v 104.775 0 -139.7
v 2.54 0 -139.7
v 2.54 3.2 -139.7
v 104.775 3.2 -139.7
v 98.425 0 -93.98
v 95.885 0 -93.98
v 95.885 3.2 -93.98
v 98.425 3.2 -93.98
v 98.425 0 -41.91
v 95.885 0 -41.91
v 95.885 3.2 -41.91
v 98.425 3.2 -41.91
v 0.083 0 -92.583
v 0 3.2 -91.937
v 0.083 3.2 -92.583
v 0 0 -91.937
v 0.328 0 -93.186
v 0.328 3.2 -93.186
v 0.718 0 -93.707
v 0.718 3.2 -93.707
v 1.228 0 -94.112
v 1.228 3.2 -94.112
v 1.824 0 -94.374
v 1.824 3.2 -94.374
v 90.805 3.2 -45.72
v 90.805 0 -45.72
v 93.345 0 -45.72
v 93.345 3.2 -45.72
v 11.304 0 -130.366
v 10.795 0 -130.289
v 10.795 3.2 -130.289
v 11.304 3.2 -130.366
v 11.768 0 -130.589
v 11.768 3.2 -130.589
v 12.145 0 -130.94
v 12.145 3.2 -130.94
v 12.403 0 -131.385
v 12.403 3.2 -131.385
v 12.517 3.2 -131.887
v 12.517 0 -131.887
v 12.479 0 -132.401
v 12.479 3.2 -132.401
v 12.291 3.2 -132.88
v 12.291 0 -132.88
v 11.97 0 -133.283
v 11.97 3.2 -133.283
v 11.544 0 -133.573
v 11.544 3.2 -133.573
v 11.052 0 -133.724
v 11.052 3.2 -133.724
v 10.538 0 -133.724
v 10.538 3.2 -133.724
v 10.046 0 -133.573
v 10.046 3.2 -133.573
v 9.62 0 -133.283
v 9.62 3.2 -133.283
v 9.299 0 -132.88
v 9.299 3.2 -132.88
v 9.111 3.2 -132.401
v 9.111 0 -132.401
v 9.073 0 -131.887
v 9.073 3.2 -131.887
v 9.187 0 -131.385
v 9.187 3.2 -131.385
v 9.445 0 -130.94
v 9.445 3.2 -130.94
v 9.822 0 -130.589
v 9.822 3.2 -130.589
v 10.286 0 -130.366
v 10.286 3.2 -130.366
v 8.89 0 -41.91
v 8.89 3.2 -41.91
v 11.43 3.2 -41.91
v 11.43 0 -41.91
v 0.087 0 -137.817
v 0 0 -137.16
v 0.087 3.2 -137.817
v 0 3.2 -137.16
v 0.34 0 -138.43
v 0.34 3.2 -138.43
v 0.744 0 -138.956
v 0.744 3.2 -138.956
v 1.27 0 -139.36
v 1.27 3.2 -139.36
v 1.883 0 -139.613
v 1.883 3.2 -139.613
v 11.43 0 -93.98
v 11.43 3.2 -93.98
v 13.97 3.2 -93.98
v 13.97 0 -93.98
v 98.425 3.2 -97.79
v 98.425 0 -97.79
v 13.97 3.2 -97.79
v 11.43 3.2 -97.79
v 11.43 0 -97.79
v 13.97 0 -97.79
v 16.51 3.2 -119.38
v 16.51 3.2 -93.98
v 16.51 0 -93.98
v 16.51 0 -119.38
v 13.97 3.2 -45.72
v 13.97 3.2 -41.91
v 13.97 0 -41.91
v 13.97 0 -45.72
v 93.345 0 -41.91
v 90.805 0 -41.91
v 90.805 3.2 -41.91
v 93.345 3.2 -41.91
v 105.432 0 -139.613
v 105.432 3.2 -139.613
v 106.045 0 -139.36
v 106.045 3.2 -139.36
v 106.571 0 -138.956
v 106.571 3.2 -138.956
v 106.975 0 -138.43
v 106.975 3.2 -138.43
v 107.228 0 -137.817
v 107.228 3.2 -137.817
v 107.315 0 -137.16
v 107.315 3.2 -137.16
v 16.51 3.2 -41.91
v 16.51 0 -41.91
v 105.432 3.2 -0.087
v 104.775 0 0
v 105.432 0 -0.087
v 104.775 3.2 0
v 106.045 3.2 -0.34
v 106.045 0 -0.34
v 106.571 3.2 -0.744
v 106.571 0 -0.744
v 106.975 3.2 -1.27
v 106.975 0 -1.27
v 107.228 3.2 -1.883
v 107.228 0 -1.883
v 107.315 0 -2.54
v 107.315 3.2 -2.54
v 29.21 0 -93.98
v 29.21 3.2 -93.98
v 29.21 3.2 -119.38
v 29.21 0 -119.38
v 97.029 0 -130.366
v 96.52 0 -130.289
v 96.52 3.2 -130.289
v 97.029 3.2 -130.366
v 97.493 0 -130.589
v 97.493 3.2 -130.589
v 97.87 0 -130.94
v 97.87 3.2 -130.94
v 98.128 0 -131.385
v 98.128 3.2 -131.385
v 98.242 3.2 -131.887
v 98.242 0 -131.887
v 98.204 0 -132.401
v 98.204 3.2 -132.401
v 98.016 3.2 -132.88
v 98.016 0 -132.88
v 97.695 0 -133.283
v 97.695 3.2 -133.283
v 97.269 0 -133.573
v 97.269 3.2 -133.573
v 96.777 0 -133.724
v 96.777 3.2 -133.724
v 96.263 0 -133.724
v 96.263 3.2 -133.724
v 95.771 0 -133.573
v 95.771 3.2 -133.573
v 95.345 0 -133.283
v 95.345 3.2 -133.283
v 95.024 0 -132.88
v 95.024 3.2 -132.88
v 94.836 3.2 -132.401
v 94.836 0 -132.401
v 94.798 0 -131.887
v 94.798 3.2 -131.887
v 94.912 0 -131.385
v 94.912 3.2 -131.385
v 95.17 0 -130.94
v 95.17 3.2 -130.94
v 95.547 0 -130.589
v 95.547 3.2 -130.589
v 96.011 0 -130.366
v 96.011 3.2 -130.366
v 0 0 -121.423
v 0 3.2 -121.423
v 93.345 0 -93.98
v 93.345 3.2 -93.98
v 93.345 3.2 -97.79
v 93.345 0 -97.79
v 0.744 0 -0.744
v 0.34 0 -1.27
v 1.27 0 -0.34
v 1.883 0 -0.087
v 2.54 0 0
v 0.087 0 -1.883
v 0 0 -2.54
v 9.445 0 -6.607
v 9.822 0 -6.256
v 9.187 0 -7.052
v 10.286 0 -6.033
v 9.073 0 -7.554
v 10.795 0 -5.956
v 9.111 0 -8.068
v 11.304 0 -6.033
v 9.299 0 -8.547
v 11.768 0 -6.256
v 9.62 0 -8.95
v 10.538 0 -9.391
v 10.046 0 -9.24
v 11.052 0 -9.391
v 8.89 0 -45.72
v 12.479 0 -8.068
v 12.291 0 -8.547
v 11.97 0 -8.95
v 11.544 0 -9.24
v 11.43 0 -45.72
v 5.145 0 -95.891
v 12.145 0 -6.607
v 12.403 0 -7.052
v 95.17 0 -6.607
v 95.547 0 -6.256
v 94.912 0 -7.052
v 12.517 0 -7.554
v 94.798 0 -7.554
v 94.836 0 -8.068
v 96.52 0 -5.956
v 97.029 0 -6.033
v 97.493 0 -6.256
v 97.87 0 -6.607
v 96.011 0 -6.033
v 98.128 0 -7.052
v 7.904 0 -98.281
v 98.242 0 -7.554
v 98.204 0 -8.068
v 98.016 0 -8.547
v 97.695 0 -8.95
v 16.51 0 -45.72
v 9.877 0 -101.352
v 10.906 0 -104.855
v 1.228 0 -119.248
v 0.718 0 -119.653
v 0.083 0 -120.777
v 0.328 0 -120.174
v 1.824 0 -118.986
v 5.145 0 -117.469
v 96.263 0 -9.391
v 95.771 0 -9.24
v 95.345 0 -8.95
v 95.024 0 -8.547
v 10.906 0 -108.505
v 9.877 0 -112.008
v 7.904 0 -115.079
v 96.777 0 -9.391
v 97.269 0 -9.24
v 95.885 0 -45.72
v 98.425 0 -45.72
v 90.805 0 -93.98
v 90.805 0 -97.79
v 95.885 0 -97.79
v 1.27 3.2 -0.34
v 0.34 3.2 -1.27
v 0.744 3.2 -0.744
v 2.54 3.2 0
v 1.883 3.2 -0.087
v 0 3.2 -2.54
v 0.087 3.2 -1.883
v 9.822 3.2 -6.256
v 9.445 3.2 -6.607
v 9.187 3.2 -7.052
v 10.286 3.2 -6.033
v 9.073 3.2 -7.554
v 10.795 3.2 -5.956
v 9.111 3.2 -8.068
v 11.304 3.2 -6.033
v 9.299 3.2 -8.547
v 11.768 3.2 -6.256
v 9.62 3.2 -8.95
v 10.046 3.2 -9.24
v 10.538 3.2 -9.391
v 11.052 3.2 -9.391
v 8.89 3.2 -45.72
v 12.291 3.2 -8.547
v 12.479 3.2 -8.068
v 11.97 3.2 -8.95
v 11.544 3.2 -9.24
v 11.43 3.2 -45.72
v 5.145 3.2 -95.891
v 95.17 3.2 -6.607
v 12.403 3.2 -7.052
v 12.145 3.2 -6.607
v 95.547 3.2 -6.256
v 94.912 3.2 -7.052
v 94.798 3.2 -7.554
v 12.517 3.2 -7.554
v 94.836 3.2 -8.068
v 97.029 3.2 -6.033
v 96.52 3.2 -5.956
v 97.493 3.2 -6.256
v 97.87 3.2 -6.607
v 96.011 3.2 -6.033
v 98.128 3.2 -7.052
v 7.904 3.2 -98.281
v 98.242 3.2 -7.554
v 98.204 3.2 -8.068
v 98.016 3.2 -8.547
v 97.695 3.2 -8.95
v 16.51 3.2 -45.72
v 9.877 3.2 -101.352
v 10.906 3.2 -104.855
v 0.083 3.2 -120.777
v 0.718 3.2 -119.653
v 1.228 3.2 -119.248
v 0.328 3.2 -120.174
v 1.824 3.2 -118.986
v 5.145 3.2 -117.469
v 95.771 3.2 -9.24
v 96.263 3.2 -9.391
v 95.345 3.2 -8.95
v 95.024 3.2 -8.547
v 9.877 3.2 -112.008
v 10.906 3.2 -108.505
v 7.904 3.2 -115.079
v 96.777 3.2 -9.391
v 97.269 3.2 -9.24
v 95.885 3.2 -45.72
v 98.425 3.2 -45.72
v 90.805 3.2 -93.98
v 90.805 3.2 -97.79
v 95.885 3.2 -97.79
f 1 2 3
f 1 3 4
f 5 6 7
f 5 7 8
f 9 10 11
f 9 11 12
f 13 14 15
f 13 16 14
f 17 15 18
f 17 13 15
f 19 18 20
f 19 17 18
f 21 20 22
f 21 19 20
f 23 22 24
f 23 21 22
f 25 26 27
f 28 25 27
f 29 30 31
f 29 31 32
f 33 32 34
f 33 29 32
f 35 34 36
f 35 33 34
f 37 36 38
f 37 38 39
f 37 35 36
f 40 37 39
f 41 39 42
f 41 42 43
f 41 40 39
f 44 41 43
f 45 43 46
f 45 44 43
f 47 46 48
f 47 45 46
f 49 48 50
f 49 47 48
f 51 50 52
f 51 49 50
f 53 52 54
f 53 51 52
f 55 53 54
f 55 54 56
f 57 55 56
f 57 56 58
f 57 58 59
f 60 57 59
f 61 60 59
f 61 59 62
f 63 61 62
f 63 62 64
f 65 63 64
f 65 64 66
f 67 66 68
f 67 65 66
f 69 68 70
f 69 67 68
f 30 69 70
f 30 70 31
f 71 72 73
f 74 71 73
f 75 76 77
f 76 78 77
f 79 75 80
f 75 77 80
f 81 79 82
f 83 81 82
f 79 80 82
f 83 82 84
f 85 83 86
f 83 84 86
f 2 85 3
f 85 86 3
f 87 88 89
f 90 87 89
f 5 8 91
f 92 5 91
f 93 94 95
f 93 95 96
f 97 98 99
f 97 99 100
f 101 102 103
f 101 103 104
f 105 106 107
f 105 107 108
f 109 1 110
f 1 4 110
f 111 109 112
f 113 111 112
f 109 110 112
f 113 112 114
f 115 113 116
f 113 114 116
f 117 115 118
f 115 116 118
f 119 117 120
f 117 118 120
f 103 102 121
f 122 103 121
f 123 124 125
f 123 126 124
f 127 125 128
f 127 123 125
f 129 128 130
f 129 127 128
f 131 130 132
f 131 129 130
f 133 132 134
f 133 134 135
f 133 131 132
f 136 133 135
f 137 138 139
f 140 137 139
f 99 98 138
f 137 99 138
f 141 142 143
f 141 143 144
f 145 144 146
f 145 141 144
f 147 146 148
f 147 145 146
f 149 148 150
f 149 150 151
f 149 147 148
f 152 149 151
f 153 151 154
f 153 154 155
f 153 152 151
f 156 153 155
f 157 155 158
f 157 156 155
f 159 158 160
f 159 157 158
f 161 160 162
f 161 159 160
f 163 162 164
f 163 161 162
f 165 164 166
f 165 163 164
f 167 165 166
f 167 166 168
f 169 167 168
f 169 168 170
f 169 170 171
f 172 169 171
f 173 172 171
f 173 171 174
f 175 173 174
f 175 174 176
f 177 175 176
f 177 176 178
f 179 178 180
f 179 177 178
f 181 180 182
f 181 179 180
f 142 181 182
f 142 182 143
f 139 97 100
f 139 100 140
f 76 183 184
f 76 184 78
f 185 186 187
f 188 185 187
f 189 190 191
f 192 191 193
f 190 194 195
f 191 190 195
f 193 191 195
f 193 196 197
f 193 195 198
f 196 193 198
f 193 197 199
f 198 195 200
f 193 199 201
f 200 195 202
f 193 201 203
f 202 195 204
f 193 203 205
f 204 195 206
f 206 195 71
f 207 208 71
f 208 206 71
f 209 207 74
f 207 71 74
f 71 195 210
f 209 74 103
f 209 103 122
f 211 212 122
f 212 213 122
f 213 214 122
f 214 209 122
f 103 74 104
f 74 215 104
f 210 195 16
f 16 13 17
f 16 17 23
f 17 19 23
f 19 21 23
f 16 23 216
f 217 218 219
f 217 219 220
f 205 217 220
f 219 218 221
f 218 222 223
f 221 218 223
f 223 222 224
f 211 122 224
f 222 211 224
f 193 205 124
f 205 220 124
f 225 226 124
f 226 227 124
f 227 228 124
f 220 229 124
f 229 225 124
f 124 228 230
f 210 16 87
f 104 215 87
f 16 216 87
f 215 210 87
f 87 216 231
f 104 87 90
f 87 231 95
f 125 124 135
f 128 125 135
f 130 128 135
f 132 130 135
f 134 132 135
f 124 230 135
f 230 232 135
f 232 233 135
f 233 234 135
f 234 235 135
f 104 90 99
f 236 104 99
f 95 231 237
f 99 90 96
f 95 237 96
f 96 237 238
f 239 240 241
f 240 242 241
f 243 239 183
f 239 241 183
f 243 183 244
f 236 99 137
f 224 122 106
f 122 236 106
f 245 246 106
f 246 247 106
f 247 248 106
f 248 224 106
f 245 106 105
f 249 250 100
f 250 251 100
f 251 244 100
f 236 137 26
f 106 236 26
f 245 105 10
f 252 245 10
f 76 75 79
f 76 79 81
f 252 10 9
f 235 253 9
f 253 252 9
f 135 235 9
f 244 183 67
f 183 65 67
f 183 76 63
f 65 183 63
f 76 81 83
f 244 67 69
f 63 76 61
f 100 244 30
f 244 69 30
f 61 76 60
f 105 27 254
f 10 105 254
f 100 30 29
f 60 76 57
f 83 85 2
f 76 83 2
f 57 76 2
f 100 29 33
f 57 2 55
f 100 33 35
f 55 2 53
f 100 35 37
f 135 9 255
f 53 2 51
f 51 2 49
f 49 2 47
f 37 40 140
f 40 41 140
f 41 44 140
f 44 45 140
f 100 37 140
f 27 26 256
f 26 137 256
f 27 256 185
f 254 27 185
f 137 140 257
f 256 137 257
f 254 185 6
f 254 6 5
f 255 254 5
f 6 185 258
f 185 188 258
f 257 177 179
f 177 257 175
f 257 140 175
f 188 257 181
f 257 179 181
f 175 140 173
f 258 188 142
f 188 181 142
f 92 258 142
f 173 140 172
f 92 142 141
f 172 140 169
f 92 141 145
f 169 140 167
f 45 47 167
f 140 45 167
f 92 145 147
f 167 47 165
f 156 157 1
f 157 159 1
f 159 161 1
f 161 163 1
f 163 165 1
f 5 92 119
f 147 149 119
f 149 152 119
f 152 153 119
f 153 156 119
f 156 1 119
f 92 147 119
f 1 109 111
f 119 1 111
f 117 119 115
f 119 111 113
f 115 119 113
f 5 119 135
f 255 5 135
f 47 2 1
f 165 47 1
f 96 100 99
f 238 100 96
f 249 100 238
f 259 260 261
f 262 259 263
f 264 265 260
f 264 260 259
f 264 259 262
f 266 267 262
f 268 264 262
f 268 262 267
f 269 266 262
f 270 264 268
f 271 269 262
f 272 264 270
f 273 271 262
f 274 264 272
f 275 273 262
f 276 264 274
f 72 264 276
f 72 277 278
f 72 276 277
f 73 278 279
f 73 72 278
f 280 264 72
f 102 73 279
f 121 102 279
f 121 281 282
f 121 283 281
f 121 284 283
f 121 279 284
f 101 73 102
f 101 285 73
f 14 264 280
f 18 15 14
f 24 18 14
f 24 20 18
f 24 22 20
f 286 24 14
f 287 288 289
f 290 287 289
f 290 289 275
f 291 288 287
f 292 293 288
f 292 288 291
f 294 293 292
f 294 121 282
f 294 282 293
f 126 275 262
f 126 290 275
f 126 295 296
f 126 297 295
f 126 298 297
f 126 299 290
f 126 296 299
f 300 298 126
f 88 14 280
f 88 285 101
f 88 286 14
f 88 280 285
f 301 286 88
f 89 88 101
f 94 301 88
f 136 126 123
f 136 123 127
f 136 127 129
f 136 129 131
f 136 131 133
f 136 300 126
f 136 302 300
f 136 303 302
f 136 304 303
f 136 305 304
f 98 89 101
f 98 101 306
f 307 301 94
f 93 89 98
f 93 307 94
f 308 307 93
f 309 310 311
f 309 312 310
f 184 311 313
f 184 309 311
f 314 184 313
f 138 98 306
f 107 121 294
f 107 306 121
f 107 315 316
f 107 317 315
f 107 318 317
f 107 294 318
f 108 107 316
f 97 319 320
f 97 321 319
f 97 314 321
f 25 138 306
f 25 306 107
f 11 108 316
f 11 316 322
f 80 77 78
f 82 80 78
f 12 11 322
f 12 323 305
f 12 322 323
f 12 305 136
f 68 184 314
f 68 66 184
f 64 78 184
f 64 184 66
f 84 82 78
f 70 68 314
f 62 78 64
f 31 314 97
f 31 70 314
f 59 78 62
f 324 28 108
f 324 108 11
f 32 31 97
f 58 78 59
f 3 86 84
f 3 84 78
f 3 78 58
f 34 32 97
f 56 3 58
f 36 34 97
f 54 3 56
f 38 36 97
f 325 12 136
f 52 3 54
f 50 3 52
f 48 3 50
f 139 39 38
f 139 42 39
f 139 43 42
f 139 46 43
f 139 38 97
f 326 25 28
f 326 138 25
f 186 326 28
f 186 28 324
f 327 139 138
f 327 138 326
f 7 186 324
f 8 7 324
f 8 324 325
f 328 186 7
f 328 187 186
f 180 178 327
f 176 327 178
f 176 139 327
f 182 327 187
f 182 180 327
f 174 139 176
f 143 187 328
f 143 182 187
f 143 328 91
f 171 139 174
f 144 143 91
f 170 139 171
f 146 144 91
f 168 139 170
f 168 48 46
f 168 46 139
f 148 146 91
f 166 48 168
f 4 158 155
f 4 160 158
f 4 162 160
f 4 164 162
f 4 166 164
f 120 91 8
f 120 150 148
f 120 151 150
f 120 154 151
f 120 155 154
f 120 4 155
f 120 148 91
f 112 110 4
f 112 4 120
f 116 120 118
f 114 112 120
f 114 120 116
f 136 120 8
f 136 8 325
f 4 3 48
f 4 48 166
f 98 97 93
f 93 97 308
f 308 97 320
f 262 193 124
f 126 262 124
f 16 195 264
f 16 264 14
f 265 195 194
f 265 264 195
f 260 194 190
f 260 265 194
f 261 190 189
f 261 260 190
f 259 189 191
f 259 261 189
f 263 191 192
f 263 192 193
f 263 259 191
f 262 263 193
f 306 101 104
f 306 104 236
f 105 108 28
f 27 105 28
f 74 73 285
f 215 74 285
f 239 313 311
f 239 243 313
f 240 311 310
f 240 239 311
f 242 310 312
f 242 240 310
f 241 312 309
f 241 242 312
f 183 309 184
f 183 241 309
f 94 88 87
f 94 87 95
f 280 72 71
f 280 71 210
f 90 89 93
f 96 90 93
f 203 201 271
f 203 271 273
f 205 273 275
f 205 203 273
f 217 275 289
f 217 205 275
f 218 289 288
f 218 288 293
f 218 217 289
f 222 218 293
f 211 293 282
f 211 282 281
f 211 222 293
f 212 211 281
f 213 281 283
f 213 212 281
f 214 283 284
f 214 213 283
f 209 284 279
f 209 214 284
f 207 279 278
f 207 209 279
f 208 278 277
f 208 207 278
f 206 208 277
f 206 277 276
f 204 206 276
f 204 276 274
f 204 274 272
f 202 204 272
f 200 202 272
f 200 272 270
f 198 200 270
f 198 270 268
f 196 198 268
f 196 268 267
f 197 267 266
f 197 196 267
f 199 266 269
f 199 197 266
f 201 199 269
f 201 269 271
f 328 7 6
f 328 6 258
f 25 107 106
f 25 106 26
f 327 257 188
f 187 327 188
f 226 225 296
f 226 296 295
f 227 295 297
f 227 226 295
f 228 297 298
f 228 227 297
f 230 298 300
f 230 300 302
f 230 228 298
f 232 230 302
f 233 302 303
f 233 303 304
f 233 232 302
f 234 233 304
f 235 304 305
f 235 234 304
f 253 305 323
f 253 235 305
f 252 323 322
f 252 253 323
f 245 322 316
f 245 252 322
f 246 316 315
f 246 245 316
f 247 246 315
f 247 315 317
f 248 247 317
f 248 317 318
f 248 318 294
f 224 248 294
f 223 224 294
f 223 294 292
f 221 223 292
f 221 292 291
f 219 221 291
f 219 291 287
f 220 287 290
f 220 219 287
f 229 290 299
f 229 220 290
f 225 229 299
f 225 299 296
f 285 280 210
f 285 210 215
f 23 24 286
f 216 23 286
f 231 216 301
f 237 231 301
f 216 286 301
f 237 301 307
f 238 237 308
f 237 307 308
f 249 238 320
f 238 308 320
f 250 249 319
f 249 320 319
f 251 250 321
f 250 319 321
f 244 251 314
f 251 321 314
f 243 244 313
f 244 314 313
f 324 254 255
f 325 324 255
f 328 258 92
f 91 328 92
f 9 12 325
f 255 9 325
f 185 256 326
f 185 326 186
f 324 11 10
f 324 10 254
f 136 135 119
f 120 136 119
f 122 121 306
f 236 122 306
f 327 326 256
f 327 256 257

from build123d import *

# Parameters (mm, degrees)
SKETCH1_W           = 107.315
SKETCH1_H           = 139.7
SKETCH1_R           = 1.7272
BOSS_EXTRUDE1_DEPTH = 3.2004
SKETCH2_W           = 12.7
SKETCH2_H           = 25.4
CUT_EXTRUDE1_DEPTH  = 3.2004
FILLET1_R           = 2.54
SKETCH3_W           = 2.54
SKETCH3_H           = 3.81
CUT_EXTRUDE2_DEPTH  = 3.2004


with BuildPart() as part:
    # Sketch1 → Boss-Extrude1 (new body)
    with BuildSketch(Plane(origin=(0, 0, 0), x_dir=(1, 0, 0), z_dir=(0, 1, 0))):
        with Locations((53.6575, 69.85)):
            Rectangle(SKETCH1_W, SKETCH1_H)
        with Locations(Location((10.795, 132.0165, 0), (0, 0, 270))):
            Circle(SKETCH1_R, mode=Mode.SUBTRACT)
        with Locations(Location((96.52, 132.0165, 0), (0, 0, 270))):
            Circle(SKETCH1_R, mode=Mode.SUBTRACT)
        with Locations(Location((96.52, 7.6835, 0), (0, 0, 270))):
            Circle(SKETCH1_R, mode=Mode.SUBTRACT)
        with Locations(Location((10.795, 7.6835, 0), (0, 0, 270))):
            Circle(SKETCH1_R, mode=Mode.SUBTRACT)
    extrude(amount=BOSS_EXTRUDE1_DEPTH)

    # Sketch2 → Cut-Extrude1 (cut)
    with BuildSketch(Plane(origin=(0, 3.2004, 0), x_dir=(1, 0, 0), z_dir=(0, 1, 0))):
        with BuildLine():
            Line((0, 119.38), (0, 93.98))
            ThreePointArc((0, 93.98), (11.036508986, 106.68), (0, 119.38))
        make_face()
        with Locations((22.86, 106.68)):
            Rectangle(SKETCH2_W, SKETCH2_H)
    extrude(amount=-CUT_EXTRUDE1_DEPTH, mode=Mode.SUBTRACT)

    # Fillet1
    fillet1_edges = [part.edges().sort_by_distance(p)[0] for p in [
        (0, 1.6002, -119.38),
        (0, 1.6002, -93.98),
        (0, 1.6002, -139.7),
        (107.315, 1.6002, -139.7),
        (107.315, 1.6002, 0),
        (0, 1.6002, 0),
    ]]
    fillet(fillet1_edges, radius=FILLET1_R)

    # Sketch3 → Cut-Extrude2 (cut)
    with BuildSketch(Plane(origin=(0, 3.2004, 0), x_dir=(1, 0, 0), z_dir=(0, 1, 0))):
        with Locations((92.075, 43.815)):
            Rectangle(SKETCH3_W, SKETCH3_H)
        with Locations((12.7, 95.885)):
            Rectangle(SKETCH3_W, SKETCH3_H)
        with Locations((97.155, 43.815)):
            Rectangle(SKETCH3_W, SKETCH3_H)
        with Locations((97.155, 95.885)):
            Rectangle(SKETCH3_W, SKETCH3_H)
        with Locations((92.075, 95.885)):
            Rectangle(SKETCH3_W, SKETCH3_H)
        with Locations((10.16, 43.815)):
            Rectangle(SKETCH3_W, SKETCH3_H)
        with Locations((15.24, 43.815)):
            Rectangle(SKETCH3_W, SKETCH3_H)
    extrude(amount=-CUT_EXTRUDE2_DEPTH, mode=Mode.SUBTRACT)


solid = part.part
